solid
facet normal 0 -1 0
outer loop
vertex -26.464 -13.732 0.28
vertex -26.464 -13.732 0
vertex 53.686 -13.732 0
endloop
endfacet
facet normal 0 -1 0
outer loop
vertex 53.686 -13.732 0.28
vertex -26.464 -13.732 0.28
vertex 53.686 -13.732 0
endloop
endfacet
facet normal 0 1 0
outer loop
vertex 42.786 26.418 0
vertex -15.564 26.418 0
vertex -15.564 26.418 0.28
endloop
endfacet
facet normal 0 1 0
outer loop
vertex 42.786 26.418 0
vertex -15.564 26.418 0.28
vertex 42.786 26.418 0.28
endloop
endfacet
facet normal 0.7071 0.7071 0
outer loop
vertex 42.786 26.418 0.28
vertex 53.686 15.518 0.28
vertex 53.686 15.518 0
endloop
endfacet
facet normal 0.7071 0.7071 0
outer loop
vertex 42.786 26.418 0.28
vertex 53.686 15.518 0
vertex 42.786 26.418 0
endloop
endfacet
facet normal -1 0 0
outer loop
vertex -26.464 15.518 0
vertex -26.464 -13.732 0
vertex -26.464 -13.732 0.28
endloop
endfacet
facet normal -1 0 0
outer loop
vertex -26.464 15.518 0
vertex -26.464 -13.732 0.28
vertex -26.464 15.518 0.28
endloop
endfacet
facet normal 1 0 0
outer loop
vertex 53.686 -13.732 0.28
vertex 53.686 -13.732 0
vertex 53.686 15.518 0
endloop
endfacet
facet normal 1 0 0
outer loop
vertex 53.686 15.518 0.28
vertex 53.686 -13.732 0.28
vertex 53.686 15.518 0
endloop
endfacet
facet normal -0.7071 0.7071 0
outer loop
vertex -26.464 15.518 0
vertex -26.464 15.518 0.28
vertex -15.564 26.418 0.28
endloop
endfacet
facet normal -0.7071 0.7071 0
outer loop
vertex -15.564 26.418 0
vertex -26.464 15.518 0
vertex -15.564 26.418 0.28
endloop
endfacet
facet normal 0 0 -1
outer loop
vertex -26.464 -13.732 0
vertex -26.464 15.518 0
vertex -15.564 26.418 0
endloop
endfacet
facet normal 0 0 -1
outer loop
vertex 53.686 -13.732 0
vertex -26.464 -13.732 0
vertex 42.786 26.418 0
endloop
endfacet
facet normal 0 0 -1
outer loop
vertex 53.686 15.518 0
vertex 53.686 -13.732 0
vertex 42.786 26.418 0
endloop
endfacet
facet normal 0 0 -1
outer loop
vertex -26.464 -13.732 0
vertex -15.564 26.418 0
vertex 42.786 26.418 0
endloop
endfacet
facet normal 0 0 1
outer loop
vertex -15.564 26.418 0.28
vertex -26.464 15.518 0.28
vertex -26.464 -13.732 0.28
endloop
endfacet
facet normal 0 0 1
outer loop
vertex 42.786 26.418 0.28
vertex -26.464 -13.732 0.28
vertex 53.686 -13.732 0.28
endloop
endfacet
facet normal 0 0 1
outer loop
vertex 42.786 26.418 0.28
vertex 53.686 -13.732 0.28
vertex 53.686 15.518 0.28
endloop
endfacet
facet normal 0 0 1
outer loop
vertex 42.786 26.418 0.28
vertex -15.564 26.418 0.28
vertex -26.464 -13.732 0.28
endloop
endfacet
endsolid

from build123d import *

# Parameters (mm, degrees)
SKETCH1_W           = 80.15
SKETCH1_H           = 40.15
BOSS_EXTRUDE2_DEPTH = 0.28
CUT_EXTRUDE1_DEPTH  = 110.28
CUT_EXTRUDE2_DEPTH  = 10


with BuildPart() as part:
    # Sketch1 → Boss-Extrude2 (new body)
    with BuildSketch(Plane.XY):
        with Locations((13.610981812, 6.34266398)):
            Rectangle(SKETCH1_W, SKETCH1_H)
    extrude(amount=BOSS_EXTRUDE2_DEPTH)

    # Sketch3 → Cut-Extrude1 (cut)
    with BuildSketch(Plane.XY.offset(0.28)):
        Polygon((53.685981812, 26.41766398), (53.685981812, 15.51766398), (42.785981812, 26.41766398), align=None)
    extrude(amount=-CUT_EXTRUDE1_DEPTH, mode=Mode.SUBTRACT)

    # Sketch6 → Cut-Extrude2 (cut)
    with BuildSketch(Plane.XY.offset(0.28)):
        Polygon((-26.464018188, 26.41766398), (-26.464018188, 15.51766398), (-15.564018188, 26.41766398), align=None)
    extrude(amount=-CUT_EXTRUDE2_DEPTH, mode=Mode.SUBTRACT)


solid = part.part
